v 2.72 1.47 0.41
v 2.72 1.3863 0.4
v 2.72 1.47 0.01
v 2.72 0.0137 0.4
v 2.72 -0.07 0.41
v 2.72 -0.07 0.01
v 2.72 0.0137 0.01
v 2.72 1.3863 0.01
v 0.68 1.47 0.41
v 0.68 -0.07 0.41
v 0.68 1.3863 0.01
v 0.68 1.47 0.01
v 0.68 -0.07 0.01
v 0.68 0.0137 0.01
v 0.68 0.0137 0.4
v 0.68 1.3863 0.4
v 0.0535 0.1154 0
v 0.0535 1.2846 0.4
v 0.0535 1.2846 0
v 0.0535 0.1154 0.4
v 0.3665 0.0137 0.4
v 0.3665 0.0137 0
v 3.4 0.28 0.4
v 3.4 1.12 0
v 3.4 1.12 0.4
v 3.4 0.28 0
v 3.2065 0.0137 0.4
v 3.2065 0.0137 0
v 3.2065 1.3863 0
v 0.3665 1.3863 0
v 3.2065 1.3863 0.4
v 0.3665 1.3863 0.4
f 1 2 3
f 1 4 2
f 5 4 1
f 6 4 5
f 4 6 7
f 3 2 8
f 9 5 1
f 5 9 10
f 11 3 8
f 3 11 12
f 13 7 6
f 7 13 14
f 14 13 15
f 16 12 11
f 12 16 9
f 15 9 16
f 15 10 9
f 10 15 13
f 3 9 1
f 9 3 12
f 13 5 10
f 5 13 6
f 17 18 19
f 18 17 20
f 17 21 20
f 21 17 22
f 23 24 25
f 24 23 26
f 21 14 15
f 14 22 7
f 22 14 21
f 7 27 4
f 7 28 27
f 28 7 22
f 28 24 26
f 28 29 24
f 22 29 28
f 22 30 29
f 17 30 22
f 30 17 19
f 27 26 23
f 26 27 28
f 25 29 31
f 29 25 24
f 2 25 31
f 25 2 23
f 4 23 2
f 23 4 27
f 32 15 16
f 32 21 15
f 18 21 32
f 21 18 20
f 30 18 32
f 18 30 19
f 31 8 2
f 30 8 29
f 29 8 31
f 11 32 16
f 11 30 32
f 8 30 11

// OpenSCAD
/**
 * Module: Placeholder for schottky diodes
 *
 * Author: Karim Aziiev <karim.aziiev@gmail.com>
 * License: GPL-3.0-or-later
 */

include <../../colors.scad>
include <../presets.scad>

use <../../lib/functions.scad>
use <../../lib/plist.scad>
use <smd_resistor.scad>

module schottky_diode(plist=schottky_diode_plist, center=false) {
  assert(plist_is(plist) && len(plist) > 0, "Supply a hardware specification");
  size = plist_get("placeholder_size", plist, [3.4, 1.4, 0.4]);
  x = size[0];
  y = size[1];

  border_color = plist_get("border_color", plist, "white");

  body_h = plist_get("body_h", plist, 0.01);
  border_w = plist_get("border_w", plist, undef);
  border_p = plist_get("border_p", plist, undef);
  body_color = plist_get("body_color", plist, matte_black);
  fillet_factor = plist_get("fillet_factor", plist, 0.2);
  pad_color = plist_get("pad_color", plist, "lightyellow");
  pad_factor_x = plist_get("pad_factor_x", plist, x > y ? 0.6 : 1.1);
  pad_factor_y = plist_get("pad_factor_y", plist, x < y ? 0.6 : 1.1);
  marking = plist_get("marking", plist, undef);
  mark_color = plist_get("mark_color", plist, undef);
  mark_size = plist_get("mark_size", plist, undef);
  mark_font = plist_get("mark_font", plist, "Liberation Sans:style=Bold");
  mark_spacing = plist_get("mark_spacing", plist, 0.8);
  use_inner_round = plist_get("use_inner_round", plist, false);

  smd_resistor(size=size,
               center=center,
               border_color=border_color,
               body_h=body_h,
               border_w=border_w,
               border_p=border_p,
               body_color=body_color,
               fillet_factor=fillet_factor,
               pad_color=pad_color,
               pad_factor_x=pad_factor_x,
               pad_factor_y=pad_factor_y,
               marking=marking,
               mark_color=mark_color,
               mark_size=mark_size,
               mark_font=mark_font,
               mark_spacing=mark_spacing,
               use_inner_round=use_inner_round);
}

schottky_diode(["type", "schottky_diode",
                "size", [3, 2, 1]]);
